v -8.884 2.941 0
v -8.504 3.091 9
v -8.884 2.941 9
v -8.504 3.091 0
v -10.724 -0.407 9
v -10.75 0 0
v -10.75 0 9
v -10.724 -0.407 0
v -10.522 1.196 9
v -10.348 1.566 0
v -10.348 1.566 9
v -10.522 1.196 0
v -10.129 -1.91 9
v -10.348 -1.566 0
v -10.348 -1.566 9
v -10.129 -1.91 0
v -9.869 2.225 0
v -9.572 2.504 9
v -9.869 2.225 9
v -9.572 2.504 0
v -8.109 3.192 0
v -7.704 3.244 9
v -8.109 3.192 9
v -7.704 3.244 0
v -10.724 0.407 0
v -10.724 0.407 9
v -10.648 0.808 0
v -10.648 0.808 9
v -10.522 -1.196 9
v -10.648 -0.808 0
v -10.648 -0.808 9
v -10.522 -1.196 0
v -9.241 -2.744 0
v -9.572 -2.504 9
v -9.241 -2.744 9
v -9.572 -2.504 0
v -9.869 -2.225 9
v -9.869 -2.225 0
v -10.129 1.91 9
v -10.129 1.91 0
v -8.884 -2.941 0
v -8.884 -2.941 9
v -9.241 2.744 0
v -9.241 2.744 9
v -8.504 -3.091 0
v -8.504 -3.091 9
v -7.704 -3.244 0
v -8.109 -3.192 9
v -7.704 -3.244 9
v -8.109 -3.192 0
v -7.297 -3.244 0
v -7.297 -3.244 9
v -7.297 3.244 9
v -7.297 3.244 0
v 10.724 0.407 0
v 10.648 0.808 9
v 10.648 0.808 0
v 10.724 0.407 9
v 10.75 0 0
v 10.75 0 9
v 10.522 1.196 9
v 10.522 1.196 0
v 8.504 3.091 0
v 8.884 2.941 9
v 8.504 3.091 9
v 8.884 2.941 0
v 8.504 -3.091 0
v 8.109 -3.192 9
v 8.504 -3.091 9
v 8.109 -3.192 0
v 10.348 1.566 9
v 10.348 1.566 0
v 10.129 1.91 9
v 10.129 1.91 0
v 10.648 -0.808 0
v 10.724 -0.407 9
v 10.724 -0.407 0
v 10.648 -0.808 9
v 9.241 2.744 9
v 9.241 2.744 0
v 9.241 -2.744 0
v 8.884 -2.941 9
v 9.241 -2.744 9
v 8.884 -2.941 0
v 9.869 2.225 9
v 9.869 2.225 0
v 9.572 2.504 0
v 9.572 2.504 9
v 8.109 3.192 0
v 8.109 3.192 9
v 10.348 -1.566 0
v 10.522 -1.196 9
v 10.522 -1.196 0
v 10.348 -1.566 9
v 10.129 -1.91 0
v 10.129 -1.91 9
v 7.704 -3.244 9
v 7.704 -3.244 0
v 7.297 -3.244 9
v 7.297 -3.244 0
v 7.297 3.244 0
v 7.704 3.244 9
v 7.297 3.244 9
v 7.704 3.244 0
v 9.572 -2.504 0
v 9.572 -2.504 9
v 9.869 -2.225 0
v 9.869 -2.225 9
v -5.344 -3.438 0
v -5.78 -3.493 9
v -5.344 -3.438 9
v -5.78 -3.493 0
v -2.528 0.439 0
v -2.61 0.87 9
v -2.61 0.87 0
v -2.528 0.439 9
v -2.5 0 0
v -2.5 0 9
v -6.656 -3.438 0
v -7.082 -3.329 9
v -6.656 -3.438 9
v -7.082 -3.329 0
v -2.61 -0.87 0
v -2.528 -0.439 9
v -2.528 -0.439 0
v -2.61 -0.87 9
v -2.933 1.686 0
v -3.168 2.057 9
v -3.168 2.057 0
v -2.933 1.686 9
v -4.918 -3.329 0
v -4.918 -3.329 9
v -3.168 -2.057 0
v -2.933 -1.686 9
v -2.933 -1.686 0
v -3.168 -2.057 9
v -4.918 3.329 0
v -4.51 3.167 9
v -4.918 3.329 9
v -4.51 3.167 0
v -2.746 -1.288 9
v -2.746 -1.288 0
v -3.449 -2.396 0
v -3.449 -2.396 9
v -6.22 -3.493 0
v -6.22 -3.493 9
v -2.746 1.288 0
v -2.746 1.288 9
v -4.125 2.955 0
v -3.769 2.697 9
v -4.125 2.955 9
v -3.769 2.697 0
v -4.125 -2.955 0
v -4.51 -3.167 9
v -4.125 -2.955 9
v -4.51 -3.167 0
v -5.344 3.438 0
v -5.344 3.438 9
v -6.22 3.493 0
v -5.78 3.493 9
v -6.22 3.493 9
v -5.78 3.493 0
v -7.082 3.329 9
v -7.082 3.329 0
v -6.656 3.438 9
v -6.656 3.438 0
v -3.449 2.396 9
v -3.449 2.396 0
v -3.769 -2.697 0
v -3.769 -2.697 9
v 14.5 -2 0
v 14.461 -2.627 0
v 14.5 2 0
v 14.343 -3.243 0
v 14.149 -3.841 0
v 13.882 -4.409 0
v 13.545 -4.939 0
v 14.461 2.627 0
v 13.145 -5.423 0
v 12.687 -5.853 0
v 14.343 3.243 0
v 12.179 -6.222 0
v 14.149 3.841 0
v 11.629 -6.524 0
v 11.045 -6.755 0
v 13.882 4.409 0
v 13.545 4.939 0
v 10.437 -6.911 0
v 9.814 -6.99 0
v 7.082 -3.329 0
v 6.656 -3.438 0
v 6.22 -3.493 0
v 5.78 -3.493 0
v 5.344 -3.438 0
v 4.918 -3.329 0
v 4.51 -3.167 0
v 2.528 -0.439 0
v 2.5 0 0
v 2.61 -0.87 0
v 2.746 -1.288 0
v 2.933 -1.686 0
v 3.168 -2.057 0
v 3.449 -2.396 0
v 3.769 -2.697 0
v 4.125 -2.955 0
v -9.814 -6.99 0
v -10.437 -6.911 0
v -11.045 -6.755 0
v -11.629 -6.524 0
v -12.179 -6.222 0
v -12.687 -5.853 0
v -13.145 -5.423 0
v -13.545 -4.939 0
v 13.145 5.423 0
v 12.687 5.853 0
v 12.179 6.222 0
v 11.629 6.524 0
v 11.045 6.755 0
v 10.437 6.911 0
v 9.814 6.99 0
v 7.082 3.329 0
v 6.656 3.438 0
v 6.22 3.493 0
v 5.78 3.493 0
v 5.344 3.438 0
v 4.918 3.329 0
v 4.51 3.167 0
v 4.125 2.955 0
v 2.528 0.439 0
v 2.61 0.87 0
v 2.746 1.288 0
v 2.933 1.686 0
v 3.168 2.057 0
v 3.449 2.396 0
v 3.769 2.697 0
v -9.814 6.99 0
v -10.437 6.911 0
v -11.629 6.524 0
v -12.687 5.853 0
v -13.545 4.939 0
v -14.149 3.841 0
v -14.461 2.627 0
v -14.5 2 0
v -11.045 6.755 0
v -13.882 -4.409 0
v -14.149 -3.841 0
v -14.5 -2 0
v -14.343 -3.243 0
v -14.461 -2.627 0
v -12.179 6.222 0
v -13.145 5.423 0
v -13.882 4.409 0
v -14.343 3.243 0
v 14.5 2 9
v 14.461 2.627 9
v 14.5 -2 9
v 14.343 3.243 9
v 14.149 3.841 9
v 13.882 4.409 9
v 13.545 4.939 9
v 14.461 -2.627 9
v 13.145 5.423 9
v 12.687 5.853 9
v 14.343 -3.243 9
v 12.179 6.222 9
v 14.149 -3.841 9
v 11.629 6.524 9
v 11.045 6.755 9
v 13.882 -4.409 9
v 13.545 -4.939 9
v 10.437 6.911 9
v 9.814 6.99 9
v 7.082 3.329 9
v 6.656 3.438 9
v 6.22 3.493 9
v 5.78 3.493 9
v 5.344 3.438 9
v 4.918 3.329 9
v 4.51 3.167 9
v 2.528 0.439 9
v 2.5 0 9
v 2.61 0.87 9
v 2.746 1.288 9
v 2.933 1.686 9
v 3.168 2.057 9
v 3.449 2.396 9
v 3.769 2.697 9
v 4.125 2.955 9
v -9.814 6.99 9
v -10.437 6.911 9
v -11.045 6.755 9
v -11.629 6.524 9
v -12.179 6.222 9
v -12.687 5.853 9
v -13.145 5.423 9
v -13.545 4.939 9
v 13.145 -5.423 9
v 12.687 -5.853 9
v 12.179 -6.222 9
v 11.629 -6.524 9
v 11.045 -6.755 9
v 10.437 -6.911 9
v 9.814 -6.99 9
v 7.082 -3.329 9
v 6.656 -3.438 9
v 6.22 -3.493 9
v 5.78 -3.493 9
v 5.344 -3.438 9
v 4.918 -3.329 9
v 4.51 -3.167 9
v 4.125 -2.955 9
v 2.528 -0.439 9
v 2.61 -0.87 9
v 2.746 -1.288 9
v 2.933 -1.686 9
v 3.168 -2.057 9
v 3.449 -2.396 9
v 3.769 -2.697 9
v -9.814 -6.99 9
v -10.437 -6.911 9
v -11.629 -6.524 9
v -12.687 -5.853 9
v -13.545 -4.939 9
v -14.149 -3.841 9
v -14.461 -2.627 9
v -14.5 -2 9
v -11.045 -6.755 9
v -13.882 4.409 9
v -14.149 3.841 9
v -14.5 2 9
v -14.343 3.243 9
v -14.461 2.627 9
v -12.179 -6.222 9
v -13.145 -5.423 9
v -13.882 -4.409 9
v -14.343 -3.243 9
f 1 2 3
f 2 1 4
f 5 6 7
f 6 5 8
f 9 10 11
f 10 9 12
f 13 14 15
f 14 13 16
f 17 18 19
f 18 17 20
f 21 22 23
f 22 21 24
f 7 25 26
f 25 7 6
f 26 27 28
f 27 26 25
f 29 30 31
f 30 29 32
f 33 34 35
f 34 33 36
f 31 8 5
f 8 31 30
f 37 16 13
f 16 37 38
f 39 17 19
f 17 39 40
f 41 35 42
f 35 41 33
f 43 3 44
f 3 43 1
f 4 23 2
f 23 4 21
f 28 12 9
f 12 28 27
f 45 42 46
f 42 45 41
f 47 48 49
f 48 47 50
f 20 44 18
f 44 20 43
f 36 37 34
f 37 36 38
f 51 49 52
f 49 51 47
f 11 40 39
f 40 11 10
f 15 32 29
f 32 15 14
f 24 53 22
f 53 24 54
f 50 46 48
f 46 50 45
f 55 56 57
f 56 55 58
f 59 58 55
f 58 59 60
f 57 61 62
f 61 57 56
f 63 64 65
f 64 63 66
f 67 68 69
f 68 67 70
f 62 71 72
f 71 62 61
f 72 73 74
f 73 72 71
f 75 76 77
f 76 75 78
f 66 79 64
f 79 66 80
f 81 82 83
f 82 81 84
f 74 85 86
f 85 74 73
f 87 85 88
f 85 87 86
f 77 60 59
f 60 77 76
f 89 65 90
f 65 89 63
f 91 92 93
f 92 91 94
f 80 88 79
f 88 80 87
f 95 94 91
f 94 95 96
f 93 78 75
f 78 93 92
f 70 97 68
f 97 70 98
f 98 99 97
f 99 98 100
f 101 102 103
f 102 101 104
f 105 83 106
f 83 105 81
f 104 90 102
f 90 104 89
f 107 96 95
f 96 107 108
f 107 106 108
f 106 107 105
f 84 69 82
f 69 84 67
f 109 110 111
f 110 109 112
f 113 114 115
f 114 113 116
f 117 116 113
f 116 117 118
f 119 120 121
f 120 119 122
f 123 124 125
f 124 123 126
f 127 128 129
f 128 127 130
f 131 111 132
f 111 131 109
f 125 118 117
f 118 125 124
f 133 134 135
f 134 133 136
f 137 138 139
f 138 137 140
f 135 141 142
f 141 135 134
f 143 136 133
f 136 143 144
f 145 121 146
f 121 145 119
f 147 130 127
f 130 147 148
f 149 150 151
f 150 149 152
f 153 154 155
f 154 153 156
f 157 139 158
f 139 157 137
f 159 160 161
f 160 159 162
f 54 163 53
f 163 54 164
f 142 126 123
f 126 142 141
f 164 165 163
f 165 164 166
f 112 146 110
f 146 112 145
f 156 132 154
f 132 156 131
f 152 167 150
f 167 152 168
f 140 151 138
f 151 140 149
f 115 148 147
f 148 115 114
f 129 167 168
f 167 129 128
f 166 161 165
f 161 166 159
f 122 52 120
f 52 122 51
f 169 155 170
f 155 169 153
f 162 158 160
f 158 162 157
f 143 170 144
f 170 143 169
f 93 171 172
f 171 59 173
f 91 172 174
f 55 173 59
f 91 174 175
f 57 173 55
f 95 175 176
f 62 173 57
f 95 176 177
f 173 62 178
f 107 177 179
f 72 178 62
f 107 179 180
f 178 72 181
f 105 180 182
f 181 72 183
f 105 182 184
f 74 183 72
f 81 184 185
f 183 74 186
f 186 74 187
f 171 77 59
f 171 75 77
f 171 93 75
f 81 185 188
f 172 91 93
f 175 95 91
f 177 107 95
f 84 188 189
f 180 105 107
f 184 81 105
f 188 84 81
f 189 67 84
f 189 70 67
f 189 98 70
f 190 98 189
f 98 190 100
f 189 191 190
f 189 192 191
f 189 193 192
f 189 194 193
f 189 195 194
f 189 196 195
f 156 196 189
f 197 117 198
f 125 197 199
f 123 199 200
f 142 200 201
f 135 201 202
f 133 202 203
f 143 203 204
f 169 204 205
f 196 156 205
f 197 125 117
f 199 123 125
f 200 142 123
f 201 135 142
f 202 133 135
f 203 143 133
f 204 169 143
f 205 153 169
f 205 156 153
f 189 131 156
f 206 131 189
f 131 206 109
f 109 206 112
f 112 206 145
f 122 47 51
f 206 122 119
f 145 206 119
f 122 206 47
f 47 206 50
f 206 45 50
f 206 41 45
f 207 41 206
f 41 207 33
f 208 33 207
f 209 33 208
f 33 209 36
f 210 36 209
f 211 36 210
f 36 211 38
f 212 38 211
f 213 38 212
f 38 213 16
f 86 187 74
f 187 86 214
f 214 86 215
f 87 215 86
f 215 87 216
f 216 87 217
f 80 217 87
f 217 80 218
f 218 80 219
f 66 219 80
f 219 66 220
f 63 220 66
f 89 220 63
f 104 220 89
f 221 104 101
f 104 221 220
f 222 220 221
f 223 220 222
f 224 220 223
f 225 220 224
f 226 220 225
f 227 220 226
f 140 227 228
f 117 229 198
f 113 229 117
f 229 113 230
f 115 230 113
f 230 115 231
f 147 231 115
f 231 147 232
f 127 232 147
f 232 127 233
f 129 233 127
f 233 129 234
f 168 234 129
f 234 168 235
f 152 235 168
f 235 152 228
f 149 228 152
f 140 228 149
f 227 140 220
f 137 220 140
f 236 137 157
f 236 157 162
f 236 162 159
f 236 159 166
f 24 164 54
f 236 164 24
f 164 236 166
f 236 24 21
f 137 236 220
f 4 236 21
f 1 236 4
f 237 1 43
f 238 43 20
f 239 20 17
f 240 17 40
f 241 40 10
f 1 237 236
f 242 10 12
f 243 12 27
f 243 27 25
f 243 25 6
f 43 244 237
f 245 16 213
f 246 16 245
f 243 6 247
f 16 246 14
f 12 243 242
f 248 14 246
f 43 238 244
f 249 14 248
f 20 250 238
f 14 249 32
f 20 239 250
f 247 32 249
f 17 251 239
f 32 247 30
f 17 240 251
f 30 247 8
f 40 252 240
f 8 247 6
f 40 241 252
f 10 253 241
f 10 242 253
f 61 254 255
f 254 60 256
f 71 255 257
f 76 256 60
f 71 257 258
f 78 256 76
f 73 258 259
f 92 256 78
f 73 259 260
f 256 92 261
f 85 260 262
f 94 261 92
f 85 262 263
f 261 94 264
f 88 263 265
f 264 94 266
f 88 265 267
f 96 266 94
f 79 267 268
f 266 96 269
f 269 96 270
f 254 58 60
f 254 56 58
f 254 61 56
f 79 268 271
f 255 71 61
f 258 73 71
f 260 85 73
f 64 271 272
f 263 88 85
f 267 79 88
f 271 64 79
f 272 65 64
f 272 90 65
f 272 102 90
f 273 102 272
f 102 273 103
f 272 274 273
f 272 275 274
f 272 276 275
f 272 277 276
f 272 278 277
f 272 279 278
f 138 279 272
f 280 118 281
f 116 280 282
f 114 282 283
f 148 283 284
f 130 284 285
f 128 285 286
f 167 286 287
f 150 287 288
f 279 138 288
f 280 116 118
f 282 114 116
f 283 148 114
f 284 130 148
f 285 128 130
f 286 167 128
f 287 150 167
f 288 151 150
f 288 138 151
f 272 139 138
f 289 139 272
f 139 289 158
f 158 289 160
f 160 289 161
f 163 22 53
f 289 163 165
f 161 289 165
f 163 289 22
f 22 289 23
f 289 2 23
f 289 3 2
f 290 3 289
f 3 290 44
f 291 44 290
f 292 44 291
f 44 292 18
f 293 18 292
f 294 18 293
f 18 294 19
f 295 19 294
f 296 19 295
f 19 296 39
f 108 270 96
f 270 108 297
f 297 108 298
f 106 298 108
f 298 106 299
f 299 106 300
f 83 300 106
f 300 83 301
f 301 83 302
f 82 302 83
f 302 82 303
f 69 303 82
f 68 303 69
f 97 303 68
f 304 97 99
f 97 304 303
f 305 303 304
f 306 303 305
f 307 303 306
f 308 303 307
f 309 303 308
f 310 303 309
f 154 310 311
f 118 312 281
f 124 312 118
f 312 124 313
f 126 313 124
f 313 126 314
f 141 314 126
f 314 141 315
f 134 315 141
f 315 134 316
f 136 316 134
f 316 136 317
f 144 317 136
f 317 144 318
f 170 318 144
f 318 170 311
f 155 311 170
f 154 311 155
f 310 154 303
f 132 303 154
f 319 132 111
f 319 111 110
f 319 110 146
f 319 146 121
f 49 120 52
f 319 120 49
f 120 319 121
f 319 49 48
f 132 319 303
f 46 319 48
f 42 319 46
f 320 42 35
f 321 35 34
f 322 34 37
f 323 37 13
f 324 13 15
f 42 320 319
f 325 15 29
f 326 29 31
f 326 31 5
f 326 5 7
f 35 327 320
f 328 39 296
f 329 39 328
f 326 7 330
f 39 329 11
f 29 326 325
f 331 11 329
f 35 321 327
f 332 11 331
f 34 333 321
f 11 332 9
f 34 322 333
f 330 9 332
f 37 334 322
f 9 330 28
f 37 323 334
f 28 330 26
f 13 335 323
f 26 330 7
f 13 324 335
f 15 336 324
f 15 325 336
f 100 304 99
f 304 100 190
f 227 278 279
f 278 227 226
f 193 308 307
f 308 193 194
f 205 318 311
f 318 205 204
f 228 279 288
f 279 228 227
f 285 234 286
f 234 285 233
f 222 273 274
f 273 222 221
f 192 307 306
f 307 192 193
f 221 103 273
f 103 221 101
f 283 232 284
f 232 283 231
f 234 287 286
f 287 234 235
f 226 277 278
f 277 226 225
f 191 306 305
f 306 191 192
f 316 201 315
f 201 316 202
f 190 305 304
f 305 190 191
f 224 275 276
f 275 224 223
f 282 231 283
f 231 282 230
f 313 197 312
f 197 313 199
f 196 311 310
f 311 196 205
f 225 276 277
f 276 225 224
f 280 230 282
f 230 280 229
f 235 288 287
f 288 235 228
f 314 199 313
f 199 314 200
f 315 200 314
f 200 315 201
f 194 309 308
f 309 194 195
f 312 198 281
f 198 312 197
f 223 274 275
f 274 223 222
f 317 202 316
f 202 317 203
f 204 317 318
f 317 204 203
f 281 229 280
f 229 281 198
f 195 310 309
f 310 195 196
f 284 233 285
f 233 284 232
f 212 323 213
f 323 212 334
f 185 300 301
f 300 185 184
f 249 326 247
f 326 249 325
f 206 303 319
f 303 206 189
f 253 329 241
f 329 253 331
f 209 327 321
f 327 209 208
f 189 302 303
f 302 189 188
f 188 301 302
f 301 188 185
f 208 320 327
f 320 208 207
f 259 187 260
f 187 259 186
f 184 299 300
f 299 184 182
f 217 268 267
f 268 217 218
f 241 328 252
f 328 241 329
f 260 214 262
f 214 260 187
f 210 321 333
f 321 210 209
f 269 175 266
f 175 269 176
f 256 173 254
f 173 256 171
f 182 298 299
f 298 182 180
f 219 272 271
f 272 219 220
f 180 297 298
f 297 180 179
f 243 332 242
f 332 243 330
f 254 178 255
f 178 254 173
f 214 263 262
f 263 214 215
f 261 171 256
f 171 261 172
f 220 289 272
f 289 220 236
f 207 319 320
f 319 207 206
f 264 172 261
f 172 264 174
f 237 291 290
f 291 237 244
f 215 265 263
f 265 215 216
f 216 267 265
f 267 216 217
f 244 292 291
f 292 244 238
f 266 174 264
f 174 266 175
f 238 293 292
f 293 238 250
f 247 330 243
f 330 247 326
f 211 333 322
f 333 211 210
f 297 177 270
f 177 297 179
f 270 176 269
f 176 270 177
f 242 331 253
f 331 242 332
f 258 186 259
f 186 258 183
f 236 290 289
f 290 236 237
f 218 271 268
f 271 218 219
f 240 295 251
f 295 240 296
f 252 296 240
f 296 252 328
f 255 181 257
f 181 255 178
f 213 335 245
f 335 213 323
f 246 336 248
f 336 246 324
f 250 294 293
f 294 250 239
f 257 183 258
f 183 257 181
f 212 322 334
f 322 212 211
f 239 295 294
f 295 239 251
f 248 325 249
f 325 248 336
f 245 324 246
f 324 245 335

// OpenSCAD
$fn = 50;


difference() {
	union() {
		hull() {
			translate(v = [-9.5000000000, 2.0000000000, 0]) {
				cylinder(h = 9, r = 5);
			}
			translate(v = [9.5000000000, 2.0000000000, 0]) {
				cylinder(h = 9, r = 5);
			}
			translate(v = [-9.5000000000, -2.0000000000, 0]) {
				cylinder(h = 9, r = 5);
			}
			translate(v = [9.5000000000, -2.0000000000, 0]) {
				cylinder(h = 9, r = 5);
			}
		}
	}
	union() {
		#translate(v = [-7.5000000000, 0.0000000000, -100.0000000000]) {
			cylinder(h = 200, r = 3.2500000000);
		}
		#translate(v = [-7.5000000000, 0.0000000000, -100.0000000000]) {
			cylinder(h = 200, r = 3.2500000000);
		}
		#translate(v = [7.5000000000, 0.0000000000, -100.0000000000]) {
			cylinder(h = 200, r = 3.2500000000);
		}
		#translate(v = [7.5000000000, 0.0000000000, -100.0000000000]) {
			cylinder(h = 200, r = 3.2500000000);
		}
		#translate(v = [-6.0000000000, 0, 0]) {
			cylinder(h = 9, r = 3.5000000000);
		}
		#translate(v = [6.0000000000, 0, 0]) {
			cylinder(h = 9, r = 3.5000000000);
		}
	}
}
